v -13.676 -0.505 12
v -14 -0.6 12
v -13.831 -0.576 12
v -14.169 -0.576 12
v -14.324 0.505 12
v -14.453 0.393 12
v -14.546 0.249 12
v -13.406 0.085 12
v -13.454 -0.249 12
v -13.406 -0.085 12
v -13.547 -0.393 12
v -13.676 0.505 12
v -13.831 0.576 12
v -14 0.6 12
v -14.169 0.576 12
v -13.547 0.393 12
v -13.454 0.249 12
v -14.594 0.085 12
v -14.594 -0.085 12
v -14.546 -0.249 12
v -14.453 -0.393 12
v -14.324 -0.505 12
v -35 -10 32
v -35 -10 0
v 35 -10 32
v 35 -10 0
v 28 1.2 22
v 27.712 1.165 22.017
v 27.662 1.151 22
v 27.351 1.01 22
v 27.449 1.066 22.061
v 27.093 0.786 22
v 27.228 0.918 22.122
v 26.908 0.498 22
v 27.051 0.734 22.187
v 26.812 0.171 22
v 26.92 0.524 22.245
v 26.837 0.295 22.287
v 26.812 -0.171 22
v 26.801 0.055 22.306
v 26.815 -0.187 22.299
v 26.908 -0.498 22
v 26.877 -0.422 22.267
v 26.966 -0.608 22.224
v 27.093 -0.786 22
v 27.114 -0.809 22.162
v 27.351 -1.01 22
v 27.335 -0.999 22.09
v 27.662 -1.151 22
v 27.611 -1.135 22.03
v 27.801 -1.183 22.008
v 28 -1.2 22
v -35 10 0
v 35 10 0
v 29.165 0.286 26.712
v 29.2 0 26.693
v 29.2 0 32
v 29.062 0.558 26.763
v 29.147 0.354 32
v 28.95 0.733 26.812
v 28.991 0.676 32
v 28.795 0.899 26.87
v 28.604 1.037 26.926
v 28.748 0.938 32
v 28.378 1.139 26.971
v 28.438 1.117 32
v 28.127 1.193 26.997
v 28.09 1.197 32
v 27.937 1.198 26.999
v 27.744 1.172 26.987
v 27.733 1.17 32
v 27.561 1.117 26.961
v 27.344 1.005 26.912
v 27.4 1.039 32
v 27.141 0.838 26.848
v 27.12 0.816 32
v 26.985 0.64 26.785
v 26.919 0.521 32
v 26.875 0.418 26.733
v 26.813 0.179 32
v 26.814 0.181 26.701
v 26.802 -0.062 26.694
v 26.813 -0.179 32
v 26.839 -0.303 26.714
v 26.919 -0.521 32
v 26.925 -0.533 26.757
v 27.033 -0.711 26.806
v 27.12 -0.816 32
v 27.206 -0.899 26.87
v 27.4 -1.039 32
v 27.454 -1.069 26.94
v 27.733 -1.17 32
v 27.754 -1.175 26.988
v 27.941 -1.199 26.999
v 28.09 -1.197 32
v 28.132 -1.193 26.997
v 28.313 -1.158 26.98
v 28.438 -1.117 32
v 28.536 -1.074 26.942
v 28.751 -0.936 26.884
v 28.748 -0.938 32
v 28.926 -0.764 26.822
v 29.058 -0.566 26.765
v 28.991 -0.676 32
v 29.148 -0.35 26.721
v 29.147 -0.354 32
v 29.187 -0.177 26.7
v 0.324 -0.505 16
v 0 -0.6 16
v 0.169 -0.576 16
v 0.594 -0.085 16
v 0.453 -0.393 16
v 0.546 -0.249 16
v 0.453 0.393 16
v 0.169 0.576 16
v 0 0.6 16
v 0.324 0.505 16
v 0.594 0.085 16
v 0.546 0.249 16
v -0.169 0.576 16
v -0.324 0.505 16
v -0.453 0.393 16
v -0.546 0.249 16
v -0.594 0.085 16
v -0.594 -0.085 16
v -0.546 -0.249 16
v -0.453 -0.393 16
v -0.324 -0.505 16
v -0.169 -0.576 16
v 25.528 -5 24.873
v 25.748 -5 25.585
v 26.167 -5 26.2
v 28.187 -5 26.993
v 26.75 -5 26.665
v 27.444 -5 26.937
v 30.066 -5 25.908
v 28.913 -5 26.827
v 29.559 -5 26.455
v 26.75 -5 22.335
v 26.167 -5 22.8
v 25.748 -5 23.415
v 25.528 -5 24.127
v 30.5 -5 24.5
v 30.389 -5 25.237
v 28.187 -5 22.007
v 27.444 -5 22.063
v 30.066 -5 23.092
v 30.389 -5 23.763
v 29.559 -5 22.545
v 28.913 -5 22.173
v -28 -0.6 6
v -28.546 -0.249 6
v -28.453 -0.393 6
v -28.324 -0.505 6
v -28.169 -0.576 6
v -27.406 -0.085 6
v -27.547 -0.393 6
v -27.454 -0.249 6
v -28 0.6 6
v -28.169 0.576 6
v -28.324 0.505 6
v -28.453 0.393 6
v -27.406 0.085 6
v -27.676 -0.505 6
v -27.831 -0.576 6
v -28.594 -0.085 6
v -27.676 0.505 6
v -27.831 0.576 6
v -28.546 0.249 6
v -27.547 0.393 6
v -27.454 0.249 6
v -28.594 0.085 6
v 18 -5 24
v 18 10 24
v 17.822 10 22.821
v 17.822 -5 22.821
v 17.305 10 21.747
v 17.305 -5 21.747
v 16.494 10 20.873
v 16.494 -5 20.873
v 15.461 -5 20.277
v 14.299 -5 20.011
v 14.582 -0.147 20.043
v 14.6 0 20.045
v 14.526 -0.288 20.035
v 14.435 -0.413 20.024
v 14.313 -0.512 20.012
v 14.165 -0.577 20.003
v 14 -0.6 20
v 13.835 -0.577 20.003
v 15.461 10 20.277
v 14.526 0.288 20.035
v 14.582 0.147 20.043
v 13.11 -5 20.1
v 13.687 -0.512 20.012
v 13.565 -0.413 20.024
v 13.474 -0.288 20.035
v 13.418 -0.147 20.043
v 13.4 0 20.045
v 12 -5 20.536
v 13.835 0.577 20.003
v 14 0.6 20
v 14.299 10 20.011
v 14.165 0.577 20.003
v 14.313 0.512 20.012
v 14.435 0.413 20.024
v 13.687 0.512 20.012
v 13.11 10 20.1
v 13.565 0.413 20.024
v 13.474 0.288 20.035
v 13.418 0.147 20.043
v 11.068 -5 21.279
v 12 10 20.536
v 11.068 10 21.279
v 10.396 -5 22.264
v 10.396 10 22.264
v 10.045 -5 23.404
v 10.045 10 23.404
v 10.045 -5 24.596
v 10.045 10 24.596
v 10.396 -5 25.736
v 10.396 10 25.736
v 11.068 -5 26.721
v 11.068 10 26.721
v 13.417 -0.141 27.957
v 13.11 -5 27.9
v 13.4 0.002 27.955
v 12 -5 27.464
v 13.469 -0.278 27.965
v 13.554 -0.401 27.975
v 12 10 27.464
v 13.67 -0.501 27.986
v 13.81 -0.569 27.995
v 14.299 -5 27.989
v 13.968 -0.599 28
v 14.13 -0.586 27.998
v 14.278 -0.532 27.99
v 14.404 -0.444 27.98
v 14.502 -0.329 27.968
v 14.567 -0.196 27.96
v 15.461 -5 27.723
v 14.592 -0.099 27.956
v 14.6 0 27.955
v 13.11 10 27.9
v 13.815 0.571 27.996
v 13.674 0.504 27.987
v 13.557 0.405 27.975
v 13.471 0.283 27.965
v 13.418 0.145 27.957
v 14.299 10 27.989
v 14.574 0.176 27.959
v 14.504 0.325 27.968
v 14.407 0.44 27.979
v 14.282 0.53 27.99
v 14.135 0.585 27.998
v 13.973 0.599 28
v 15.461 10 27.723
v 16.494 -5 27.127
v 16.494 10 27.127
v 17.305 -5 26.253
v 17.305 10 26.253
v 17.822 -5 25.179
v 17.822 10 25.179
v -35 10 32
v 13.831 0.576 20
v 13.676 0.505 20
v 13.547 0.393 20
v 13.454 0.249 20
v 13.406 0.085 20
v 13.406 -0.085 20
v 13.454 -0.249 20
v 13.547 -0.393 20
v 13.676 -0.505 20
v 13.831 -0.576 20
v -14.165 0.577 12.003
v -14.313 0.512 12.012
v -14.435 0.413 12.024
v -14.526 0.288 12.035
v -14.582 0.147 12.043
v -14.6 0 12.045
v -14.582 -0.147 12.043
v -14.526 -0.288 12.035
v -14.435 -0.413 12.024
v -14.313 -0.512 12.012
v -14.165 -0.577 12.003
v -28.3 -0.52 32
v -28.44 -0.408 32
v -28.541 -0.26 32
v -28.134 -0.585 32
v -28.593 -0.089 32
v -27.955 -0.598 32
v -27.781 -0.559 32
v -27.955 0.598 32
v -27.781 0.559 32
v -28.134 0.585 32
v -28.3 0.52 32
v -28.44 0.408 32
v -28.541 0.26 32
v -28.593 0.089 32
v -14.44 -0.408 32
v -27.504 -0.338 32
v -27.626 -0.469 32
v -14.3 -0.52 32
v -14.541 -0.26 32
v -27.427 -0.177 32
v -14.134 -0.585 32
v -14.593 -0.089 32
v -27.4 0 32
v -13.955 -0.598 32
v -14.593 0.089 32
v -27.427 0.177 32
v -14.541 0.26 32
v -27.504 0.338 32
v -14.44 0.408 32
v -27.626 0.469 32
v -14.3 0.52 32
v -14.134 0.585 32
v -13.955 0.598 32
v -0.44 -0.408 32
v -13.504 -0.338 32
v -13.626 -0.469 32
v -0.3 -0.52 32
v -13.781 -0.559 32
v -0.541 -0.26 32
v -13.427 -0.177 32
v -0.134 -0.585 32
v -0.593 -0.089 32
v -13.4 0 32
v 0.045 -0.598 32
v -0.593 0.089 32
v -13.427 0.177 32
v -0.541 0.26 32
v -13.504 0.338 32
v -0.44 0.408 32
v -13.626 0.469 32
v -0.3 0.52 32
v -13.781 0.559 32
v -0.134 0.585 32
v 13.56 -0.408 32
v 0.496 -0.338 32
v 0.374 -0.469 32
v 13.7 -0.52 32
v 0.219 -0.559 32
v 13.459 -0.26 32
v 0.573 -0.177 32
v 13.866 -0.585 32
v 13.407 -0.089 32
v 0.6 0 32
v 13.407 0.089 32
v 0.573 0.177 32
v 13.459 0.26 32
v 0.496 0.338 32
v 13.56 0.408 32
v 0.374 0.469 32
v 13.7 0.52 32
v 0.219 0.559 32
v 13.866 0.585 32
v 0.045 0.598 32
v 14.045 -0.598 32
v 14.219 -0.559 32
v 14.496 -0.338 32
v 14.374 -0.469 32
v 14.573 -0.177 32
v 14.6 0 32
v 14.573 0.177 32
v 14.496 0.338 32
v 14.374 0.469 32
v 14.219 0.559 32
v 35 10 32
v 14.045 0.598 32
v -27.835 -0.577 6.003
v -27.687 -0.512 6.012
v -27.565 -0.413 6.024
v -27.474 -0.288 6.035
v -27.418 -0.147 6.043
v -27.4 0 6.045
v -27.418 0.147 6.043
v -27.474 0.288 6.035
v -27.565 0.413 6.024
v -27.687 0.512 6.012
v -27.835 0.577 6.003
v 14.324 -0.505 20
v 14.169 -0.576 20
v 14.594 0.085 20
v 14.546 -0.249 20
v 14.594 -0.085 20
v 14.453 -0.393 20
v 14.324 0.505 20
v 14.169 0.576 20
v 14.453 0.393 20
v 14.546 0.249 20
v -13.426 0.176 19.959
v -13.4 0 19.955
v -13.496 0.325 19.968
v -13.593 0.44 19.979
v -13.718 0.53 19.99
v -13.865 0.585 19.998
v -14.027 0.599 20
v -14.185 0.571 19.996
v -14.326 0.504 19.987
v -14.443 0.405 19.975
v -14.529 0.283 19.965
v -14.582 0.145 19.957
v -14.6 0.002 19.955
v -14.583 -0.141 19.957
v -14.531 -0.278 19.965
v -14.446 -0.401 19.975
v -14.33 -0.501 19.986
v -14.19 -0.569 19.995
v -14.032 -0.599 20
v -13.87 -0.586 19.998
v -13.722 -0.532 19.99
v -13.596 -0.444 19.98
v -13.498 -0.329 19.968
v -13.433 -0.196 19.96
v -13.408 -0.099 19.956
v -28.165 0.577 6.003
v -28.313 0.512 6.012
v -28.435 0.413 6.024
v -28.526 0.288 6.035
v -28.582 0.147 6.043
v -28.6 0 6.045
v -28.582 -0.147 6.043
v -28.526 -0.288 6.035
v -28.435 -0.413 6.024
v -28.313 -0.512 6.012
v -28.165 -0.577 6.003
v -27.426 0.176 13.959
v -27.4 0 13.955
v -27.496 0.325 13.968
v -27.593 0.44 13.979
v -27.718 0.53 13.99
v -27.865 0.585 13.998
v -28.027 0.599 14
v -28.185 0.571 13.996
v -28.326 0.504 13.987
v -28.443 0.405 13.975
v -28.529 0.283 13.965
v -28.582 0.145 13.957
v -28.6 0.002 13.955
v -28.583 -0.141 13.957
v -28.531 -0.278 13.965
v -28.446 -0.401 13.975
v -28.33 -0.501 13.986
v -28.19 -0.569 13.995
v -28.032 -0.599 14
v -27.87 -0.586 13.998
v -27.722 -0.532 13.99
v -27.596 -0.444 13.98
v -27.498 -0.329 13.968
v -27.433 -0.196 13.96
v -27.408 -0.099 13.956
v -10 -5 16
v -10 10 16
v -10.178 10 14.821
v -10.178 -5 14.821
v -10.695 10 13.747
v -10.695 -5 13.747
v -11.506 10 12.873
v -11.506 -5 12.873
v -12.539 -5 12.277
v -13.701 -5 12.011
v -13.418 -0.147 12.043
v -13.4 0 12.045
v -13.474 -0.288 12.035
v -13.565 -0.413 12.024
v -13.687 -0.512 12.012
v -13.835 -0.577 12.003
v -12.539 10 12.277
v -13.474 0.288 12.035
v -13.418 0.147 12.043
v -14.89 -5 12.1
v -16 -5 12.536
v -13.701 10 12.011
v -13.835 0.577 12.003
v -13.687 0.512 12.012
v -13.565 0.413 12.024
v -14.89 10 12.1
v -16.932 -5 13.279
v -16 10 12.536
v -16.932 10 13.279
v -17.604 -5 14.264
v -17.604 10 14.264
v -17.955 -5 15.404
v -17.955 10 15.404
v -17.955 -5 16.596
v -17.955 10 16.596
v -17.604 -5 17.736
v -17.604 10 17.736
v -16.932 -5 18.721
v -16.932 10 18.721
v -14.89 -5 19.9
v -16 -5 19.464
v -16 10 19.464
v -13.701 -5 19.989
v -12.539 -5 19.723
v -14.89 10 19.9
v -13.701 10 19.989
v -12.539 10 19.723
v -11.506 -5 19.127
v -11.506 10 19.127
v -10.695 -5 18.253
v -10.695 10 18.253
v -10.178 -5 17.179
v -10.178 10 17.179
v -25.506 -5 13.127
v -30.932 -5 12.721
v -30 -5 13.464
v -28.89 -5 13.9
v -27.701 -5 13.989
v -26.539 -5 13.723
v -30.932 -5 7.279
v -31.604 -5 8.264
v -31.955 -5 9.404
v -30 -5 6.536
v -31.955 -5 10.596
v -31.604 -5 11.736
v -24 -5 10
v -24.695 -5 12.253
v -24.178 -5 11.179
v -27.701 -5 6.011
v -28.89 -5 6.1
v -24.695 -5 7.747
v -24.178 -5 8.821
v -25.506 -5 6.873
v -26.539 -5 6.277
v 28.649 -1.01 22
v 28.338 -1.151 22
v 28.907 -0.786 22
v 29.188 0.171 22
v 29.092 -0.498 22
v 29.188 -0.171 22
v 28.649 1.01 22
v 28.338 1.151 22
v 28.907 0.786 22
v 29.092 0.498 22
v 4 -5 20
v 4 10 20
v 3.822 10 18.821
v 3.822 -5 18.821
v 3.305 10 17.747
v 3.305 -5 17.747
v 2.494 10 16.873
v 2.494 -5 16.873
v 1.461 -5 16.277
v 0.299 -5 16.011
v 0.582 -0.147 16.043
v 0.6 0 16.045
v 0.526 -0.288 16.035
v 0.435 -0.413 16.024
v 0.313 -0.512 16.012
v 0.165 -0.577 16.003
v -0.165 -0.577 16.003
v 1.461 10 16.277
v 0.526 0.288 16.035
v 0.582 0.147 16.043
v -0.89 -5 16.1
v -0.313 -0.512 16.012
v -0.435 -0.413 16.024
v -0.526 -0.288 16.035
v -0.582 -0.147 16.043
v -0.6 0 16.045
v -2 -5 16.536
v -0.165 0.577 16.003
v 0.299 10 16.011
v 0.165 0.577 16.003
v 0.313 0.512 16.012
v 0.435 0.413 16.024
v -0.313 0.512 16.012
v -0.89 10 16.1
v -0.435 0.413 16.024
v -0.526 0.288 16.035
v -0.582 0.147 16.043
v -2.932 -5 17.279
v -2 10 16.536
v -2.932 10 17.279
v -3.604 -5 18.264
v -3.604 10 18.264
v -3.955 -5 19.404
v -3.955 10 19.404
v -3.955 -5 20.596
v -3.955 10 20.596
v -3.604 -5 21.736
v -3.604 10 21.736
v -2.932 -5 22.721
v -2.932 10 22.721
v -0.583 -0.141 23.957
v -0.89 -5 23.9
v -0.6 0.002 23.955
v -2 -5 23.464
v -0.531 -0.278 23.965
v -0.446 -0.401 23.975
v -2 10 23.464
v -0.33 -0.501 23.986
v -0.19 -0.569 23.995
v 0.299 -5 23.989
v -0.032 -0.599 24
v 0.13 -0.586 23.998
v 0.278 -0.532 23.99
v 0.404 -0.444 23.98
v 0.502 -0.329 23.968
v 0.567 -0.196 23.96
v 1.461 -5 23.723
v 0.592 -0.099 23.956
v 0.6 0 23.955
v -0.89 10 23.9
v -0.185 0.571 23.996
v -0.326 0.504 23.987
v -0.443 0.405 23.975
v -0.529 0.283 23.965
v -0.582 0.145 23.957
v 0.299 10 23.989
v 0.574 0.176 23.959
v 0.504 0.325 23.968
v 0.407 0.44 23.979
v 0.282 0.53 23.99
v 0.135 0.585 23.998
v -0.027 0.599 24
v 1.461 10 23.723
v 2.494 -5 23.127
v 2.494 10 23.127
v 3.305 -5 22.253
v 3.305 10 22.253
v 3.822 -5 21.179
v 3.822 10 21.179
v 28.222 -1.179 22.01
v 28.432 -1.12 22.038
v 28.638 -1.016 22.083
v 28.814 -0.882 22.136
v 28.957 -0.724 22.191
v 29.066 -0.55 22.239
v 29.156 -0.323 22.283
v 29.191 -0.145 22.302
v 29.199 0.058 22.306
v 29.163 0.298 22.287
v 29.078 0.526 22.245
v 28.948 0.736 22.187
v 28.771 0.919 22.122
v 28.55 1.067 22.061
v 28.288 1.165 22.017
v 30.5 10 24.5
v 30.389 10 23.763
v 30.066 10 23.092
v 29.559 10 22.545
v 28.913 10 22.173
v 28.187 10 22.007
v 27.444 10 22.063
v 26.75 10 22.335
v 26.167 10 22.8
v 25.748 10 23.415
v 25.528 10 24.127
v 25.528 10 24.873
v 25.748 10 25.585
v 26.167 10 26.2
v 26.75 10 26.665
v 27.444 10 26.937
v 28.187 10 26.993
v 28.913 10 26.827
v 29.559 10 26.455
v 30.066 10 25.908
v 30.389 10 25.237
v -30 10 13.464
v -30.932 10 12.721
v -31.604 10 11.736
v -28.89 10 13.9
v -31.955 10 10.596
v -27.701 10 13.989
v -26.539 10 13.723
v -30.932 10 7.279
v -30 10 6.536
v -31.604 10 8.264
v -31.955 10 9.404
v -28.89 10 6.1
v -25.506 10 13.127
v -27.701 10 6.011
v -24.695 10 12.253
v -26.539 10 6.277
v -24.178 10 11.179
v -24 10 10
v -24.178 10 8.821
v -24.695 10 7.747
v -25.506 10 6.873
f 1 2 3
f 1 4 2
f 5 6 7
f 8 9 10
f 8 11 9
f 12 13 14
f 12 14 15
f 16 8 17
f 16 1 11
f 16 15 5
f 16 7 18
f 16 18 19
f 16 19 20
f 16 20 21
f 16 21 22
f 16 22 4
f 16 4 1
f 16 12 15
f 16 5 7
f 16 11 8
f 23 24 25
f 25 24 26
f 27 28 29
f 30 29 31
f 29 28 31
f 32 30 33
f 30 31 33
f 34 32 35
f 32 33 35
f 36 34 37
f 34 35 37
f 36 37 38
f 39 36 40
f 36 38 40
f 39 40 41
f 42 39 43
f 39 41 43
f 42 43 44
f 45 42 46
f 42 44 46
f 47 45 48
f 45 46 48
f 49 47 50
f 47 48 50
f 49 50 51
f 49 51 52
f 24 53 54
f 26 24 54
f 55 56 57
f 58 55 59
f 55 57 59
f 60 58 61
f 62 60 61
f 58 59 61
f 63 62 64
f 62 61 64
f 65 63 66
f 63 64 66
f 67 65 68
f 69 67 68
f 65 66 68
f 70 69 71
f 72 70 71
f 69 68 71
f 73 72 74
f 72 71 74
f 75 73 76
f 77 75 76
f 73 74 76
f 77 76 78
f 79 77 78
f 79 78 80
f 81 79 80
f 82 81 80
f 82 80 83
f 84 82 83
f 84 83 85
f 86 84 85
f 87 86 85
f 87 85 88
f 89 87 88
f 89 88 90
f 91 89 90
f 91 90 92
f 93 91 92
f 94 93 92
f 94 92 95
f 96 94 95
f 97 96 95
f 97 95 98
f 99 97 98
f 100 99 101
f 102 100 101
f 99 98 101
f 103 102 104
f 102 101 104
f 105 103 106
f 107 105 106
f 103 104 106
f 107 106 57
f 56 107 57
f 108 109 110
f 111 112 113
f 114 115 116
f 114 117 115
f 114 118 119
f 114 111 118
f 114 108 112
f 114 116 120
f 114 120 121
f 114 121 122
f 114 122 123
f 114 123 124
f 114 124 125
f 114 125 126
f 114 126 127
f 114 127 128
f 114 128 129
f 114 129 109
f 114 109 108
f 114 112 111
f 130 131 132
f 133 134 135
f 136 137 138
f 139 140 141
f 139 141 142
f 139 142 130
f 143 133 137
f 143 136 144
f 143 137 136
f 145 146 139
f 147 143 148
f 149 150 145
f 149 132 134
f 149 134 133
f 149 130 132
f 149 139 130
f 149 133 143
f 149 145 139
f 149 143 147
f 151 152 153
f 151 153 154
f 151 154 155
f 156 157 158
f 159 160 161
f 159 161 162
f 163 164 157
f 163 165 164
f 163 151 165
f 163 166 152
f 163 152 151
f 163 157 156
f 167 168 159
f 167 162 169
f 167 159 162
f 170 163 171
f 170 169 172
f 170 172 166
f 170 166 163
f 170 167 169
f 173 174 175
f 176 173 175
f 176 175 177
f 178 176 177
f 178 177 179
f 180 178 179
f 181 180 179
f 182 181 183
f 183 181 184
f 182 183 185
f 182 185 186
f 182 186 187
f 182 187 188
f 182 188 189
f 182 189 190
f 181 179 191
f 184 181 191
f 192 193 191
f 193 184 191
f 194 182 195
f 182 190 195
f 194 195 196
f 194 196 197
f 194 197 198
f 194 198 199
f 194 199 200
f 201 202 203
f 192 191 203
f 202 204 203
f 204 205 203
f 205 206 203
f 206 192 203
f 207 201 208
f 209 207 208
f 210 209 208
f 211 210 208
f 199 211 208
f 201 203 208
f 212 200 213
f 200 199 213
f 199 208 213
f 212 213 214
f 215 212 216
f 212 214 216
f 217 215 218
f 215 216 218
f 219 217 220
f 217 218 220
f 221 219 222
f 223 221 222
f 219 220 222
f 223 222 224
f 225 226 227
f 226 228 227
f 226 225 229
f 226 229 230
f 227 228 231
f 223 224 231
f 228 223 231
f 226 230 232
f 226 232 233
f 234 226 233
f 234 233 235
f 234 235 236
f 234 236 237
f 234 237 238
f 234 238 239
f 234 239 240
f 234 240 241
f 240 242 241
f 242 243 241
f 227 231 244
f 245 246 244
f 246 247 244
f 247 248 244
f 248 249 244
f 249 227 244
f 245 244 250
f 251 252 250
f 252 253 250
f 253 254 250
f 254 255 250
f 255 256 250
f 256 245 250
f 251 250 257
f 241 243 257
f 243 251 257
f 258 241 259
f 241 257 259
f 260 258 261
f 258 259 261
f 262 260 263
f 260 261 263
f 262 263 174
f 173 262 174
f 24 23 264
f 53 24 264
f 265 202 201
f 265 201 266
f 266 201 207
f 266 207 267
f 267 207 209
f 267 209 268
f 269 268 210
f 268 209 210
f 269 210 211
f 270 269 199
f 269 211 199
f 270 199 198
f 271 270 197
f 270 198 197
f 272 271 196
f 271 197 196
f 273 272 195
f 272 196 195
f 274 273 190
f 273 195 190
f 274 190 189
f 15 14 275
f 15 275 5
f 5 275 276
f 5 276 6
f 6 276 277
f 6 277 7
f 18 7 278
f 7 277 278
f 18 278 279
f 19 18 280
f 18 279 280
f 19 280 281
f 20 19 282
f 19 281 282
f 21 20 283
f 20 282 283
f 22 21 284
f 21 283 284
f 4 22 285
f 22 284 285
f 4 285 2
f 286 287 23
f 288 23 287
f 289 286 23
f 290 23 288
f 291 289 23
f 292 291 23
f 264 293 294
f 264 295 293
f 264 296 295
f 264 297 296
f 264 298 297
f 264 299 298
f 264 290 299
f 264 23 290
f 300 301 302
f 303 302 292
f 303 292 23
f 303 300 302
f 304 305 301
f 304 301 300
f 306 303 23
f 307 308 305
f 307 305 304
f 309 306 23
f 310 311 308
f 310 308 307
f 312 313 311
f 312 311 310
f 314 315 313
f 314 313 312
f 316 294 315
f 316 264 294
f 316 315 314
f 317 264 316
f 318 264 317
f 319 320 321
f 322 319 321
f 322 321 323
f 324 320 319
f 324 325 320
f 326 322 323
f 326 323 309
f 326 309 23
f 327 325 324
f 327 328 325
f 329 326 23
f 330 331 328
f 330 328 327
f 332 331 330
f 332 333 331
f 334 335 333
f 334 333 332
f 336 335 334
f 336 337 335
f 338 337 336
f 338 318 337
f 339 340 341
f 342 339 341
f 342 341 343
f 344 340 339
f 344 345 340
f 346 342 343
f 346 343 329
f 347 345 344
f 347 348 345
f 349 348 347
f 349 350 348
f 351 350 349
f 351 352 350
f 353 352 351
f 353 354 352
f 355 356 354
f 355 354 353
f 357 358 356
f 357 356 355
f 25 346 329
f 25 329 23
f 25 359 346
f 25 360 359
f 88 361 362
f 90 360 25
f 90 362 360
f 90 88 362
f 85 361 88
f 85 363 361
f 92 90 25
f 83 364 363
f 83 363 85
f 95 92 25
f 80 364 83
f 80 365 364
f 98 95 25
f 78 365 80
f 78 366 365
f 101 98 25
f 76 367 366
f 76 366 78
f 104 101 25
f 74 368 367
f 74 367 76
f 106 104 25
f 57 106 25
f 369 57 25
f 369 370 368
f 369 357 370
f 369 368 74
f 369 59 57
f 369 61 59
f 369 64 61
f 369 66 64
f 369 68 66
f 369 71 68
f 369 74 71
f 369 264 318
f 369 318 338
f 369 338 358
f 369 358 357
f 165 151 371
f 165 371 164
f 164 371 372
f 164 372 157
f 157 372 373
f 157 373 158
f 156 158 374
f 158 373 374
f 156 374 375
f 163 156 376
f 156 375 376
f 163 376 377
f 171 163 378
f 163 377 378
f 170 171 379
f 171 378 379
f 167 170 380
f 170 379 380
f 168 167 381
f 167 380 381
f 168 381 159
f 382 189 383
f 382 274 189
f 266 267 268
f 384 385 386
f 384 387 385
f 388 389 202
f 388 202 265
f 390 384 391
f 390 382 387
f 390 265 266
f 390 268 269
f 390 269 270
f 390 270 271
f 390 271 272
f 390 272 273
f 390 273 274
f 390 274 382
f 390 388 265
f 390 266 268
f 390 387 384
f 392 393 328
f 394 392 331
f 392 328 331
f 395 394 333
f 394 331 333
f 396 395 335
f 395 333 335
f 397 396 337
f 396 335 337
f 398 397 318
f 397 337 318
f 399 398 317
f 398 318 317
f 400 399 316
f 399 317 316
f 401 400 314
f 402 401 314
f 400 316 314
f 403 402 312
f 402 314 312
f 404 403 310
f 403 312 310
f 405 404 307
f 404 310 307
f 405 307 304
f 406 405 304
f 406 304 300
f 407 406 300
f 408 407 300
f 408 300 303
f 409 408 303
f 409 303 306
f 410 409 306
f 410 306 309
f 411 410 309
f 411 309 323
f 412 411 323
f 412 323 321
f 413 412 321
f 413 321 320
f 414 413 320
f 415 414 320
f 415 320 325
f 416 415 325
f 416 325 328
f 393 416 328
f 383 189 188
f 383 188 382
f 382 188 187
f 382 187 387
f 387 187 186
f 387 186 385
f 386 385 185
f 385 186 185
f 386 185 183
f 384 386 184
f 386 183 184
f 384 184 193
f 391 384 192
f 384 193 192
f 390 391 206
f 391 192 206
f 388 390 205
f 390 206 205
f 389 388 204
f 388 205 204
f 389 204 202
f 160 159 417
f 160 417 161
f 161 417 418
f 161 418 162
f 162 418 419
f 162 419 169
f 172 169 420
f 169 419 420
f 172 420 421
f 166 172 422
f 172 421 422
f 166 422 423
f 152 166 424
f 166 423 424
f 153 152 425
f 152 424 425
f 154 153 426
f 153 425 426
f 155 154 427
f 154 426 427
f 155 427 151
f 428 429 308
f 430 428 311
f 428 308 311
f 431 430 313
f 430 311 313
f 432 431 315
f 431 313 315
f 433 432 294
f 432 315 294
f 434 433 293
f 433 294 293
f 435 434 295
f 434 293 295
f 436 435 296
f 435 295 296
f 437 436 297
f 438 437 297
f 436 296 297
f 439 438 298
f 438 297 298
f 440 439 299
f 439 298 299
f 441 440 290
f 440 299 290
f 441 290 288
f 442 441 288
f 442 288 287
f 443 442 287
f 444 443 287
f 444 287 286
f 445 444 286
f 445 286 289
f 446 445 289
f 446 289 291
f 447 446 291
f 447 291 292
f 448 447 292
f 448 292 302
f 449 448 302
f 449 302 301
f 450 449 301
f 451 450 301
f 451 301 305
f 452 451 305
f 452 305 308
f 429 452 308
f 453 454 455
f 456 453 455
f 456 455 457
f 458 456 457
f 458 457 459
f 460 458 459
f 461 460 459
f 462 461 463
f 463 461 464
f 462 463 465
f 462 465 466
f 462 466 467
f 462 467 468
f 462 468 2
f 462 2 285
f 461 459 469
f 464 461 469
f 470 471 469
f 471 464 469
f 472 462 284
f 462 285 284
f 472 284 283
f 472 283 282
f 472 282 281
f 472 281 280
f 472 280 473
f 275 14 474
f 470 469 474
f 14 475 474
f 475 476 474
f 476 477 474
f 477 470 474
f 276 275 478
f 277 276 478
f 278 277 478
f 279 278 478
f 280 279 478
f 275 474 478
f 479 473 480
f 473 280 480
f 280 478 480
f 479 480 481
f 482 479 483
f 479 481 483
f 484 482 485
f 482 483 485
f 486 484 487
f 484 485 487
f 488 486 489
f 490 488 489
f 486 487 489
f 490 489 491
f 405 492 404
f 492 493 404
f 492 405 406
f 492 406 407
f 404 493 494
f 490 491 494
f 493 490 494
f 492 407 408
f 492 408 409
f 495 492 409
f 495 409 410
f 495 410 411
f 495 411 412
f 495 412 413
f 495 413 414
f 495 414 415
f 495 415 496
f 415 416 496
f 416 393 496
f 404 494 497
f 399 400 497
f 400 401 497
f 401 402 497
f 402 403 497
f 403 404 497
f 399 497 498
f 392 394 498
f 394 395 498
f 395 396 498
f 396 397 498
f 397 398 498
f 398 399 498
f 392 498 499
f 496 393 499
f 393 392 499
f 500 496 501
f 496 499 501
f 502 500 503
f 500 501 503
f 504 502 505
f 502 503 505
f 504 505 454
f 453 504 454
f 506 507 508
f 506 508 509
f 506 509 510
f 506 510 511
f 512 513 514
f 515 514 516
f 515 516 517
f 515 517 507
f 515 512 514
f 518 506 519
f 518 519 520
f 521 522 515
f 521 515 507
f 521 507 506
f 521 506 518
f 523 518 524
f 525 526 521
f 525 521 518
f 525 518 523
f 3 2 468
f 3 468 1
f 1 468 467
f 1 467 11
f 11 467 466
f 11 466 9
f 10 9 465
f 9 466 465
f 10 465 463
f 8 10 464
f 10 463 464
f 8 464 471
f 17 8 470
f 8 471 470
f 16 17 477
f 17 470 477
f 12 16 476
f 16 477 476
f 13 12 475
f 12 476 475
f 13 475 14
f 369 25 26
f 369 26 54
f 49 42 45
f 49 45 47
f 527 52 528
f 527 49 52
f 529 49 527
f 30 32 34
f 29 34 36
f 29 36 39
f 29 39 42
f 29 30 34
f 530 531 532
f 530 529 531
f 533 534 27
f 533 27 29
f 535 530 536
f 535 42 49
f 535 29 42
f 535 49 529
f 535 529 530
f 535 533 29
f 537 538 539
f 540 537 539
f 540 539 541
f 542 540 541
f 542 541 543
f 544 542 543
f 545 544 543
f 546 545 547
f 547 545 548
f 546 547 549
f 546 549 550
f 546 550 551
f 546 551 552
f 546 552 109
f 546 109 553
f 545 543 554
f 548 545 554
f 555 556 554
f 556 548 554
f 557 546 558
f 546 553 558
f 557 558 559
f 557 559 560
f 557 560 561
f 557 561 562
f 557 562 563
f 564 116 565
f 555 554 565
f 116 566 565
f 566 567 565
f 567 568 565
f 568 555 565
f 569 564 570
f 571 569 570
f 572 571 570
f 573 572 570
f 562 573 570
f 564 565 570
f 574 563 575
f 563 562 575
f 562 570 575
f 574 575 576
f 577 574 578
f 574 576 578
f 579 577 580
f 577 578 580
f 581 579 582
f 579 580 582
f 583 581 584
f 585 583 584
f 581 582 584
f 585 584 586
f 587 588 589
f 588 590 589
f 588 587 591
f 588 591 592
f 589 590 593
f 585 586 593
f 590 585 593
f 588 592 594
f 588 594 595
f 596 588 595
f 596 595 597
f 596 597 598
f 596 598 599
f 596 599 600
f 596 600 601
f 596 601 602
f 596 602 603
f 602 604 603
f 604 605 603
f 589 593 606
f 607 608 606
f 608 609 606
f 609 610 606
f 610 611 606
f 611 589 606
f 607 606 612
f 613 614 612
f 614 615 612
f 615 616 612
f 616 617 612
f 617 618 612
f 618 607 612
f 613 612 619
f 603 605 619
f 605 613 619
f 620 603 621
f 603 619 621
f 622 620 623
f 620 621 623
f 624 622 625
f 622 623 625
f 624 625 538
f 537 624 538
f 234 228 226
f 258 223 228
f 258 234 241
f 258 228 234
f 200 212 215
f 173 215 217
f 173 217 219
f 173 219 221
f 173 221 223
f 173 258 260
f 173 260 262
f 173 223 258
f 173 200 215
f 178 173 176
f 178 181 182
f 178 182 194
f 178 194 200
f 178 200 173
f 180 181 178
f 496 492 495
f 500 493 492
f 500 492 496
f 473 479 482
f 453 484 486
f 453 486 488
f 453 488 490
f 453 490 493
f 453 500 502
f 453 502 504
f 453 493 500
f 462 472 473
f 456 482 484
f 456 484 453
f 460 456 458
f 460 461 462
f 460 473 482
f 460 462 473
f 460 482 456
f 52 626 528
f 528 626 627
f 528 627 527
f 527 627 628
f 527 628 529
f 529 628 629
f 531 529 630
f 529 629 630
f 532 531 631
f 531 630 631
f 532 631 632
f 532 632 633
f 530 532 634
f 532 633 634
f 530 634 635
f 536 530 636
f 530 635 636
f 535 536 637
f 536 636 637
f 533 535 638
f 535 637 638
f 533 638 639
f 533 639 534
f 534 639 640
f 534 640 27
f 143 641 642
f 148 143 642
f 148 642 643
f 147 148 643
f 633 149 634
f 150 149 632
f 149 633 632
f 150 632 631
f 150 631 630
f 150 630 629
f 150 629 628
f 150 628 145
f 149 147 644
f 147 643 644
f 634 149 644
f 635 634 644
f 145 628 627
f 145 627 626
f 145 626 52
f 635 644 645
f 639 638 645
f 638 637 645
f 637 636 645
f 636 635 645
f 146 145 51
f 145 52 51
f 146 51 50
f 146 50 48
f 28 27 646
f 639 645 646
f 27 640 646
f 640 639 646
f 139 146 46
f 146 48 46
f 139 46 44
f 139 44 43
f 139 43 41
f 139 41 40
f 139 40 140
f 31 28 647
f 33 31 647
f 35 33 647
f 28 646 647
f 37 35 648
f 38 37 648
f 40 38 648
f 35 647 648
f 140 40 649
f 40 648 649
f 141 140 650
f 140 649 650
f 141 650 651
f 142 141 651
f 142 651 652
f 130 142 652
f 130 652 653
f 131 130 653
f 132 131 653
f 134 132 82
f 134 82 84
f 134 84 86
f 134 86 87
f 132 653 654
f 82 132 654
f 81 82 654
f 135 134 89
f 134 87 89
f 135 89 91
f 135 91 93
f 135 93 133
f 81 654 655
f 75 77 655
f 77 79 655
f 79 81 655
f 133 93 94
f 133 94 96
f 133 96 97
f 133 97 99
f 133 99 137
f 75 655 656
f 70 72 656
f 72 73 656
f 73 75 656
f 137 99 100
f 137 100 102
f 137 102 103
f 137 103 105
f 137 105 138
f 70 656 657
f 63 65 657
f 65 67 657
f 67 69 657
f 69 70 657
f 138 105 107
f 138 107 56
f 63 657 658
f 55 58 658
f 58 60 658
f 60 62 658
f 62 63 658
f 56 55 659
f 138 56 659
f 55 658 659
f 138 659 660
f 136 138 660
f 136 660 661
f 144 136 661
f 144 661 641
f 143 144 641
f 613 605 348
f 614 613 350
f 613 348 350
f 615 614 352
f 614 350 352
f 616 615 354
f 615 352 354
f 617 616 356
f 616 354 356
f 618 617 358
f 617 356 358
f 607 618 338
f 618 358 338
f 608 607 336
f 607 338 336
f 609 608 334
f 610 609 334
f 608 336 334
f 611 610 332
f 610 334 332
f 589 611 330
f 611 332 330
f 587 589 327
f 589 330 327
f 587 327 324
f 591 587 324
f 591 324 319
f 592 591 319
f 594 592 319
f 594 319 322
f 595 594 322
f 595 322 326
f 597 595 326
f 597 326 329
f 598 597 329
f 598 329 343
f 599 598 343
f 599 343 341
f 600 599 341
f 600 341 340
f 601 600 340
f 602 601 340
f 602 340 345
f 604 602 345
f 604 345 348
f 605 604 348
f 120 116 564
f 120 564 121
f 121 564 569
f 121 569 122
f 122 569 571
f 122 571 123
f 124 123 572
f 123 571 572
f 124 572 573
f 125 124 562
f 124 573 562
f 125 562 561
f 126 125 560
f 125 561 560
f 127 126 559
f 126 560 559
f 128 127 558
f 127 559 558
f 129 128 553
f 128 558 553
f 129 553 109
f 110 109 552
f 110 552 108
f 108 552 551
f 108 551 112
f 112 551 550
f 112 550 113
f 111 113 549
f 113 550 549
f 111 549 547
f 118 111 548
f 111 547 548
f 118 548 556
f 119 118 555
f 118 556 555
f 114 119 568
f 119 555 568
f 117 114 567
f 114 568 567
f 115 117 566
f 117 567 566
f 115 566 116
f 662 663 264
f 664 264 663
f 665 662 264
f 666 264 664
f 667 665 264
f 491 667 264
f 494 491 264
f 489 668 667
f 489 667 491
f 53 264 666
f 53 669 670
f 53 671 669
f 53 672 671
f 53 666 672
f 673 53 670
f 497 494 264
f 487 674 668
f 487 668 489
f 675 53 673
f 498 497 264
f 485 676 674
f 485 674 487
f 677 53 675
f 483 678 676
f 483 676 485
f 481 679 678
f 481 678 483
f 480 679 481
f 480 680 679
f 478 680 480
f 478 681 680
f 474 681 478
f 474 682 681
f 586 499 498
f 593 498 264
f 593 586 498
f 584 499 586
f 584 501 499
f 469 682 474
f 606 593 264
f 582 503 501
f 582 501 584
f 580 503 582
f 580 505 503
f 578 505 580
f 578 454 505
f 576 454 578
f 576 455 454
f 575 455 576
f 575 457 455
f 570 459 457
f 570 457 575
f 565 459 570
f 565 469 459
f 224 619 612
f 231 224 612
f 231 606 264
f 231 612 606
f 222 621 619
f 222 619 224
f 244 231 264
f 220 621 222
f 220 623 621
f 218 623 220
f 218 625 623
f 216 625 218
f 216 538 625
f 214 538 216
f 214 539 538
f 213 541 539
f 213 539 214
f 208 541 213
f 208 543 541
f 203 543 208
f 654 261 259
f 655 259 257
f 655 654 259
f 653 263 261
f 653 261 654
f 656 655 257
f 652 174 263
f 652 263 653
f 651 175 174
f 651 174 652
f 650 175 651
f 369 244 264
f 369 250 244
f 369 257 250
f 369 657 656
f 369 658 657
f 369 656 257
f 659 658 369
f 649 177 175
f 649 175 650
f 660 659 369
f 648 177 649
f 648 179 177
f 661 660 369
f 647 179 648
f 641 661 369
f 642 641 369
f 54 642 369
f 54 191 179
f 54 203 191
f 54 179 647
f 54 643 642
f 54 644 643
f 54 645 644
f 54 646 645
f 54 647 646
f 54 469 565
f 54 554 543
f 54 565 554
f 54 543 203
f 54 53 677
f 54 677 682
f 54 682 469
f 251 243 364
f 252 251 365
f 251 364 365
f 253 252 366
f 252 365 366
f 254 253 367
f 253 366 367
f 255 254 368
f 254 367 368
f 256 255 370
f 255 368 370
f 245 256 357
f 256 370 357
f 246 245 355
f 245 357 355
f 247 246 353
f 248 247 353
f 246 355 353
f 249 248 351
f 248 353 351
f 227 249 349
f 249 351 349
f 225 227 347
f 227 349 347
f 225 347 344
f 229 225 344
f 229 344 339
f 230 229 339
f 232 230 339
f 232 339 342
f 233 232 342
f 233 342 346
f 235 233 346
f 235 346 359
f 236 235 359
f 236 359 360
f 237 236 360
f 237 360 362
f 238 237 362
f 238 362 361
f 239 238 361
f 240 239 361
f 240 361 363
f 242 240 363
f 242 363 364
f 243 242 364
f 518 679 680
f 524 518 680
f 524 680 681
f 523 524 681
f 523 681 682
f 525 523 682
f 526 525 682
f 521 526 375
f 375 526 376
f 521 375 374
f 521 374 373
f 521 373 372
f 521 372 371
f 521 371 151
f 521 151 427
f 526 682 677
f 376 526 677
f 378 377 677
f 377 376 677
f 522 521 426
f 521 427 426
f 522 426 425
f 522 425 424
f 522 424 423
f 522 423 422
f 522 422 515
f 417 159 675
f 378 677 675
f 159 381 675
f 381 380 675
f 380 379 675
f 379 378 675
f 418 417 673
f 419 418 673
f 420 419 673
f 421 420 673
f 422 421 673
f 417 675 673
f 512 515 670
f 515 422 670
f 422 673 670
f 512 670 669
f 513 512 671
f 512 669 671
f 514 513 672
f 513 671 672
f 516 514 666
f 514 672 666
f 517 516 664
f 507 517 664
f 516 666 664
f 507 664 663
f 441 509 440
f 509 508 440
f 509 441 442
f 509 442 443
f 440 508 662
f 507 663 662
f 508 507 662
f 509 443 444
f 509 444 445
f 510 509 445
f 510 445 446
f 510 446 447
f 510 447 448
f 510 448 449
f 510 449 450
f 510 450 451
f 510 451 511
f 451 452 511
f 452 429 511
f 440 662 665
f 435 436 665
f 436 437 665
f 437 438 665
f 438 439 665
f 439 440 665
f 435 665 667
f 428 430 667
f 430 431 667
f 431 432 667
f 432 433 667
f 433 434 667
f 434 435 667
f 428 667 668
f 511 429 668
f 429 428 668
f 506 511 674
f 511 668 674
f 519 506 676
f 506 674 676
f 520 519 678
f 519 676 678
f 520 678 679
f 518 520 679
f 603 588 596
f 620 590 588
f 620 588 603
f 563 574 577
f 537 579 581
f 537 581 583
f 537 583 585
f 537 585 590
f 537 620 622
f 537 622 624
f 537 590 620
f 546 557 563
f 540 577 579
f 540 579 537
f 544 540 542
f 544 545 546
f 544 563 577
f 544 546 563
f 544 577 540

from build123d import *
from build123d.topology import SkipClean

# Parameters (mm, degrees)
SKETCH1_W           = 70
SKETCH1_H           = 20
BOSS_EXTRUDE1_DEPTH = 32
SKETCH3_R           = 1.2
CUT_EXTRUDE1_DEPTH  = 10
SKETCH3_3_R         = 0.6
CUT_EXTRUDE2_DEPTH  = 12
SKETCH3_4_R         = 0.6
CUT_EXTRUDE3_DEPTH  = 16
SKETCH3_5_R         = 0.6
CUT_EXTRUDE4_DEPTH  = 20
SKETCH3_6_R         = 0.6
CUT_EXTRUDE5_DEPTH  = 26
SKETCH4_R           = 2.5
SKETCH4_R_2         = 4
CUT_EXTRUDE6_DEPTH  = 15


with BuildPart() as part:
    # Sketch1 → Boss-Extrude1 (new body)
    with BuildSketch(Plane.XY):
        Rectangle(SKETCH1_W, SKETCH1_H)
    extrude(amount=BOSS_EXTRUDE1_DEPTH)

    # Sketch3 → Cut-Extrude1 (cut)
    with BuildSketch(Plane.XY.offset(32)):
        with Locations((28, 0)):
            Circle(SKETCH3_R)
    extrude(amount=-CUT_EXTRUDE1_DEPTH, mode=Mode.SUBTRACT)

    # Sketch3<3> → Cut-Extrude2 (cut)
    with BuildSketch(Plane.XY.offset(32)):
        with Locations((14, 0)):
            Circle(SKETCH3_3_R)
    extrude(amount=-CUT_EXTRUDE2_DEPTH, mode=Mode.SUBTRACT)

    # Sketch3<4> → Cut-Extrude3 (cut)
    with BuildSketch(Plane.XY.offset(32)):
        Circle(SKETCH3_4_R)
    extrude(amount=-CUT_EXTRUDE3_DEPTH, mode=Mode.SUBTRACT)

    # Sketch3<5> → Cut-Extrude4 (cut)
    with BuildSketch(Plane.XY.offset(32)):
        with Locations((-14, 0)):
            Circle(SKETCH3_5_R)
    extrude(amount=-CUT_EXTRUDE4_DEPTH, mode=Mode.SUBTRACT)

    # Sketch3<6> → Cut-Extrude5 (cut)
    with BuildSketch(Plane.XY.offset(32)):
        with Locations((-28, 0)):
            Circle(SKETCH3_6_R)
    extrude(amount=-CUT_EXTRUDE5_DEPTH, mode=Mode.SUBTRACT)

    # Sketch4 → Cut-Extrude6 (cut)
    with SkipClean():  # the faces are left unmerged after this step: merging them gives an invalid solid
        with BuildSketch(Plane(origin=(0, 10, 0), x_dir=(1, 0, 0), z_dir=(0, 1, 0))):
            with Locations((28, -24.5)):
                Circle(SKETCH4_R)
            with Locations((14, -24)):
                Circle(SKETCH4_R_2)
            with Locations((0, -20)):
                Circle(SKETCH4_R_2)
            with Locations((-14, -16)):
                Circle(SKETCH4_R_2)
            with Locations((-28, -10)):
                Circle(SKETCH4_R_2)
        extrude(amount=-CUT_EXTRUDE6_DEPTH, mode=Mode.SUBTRACT)


solid = part.part
